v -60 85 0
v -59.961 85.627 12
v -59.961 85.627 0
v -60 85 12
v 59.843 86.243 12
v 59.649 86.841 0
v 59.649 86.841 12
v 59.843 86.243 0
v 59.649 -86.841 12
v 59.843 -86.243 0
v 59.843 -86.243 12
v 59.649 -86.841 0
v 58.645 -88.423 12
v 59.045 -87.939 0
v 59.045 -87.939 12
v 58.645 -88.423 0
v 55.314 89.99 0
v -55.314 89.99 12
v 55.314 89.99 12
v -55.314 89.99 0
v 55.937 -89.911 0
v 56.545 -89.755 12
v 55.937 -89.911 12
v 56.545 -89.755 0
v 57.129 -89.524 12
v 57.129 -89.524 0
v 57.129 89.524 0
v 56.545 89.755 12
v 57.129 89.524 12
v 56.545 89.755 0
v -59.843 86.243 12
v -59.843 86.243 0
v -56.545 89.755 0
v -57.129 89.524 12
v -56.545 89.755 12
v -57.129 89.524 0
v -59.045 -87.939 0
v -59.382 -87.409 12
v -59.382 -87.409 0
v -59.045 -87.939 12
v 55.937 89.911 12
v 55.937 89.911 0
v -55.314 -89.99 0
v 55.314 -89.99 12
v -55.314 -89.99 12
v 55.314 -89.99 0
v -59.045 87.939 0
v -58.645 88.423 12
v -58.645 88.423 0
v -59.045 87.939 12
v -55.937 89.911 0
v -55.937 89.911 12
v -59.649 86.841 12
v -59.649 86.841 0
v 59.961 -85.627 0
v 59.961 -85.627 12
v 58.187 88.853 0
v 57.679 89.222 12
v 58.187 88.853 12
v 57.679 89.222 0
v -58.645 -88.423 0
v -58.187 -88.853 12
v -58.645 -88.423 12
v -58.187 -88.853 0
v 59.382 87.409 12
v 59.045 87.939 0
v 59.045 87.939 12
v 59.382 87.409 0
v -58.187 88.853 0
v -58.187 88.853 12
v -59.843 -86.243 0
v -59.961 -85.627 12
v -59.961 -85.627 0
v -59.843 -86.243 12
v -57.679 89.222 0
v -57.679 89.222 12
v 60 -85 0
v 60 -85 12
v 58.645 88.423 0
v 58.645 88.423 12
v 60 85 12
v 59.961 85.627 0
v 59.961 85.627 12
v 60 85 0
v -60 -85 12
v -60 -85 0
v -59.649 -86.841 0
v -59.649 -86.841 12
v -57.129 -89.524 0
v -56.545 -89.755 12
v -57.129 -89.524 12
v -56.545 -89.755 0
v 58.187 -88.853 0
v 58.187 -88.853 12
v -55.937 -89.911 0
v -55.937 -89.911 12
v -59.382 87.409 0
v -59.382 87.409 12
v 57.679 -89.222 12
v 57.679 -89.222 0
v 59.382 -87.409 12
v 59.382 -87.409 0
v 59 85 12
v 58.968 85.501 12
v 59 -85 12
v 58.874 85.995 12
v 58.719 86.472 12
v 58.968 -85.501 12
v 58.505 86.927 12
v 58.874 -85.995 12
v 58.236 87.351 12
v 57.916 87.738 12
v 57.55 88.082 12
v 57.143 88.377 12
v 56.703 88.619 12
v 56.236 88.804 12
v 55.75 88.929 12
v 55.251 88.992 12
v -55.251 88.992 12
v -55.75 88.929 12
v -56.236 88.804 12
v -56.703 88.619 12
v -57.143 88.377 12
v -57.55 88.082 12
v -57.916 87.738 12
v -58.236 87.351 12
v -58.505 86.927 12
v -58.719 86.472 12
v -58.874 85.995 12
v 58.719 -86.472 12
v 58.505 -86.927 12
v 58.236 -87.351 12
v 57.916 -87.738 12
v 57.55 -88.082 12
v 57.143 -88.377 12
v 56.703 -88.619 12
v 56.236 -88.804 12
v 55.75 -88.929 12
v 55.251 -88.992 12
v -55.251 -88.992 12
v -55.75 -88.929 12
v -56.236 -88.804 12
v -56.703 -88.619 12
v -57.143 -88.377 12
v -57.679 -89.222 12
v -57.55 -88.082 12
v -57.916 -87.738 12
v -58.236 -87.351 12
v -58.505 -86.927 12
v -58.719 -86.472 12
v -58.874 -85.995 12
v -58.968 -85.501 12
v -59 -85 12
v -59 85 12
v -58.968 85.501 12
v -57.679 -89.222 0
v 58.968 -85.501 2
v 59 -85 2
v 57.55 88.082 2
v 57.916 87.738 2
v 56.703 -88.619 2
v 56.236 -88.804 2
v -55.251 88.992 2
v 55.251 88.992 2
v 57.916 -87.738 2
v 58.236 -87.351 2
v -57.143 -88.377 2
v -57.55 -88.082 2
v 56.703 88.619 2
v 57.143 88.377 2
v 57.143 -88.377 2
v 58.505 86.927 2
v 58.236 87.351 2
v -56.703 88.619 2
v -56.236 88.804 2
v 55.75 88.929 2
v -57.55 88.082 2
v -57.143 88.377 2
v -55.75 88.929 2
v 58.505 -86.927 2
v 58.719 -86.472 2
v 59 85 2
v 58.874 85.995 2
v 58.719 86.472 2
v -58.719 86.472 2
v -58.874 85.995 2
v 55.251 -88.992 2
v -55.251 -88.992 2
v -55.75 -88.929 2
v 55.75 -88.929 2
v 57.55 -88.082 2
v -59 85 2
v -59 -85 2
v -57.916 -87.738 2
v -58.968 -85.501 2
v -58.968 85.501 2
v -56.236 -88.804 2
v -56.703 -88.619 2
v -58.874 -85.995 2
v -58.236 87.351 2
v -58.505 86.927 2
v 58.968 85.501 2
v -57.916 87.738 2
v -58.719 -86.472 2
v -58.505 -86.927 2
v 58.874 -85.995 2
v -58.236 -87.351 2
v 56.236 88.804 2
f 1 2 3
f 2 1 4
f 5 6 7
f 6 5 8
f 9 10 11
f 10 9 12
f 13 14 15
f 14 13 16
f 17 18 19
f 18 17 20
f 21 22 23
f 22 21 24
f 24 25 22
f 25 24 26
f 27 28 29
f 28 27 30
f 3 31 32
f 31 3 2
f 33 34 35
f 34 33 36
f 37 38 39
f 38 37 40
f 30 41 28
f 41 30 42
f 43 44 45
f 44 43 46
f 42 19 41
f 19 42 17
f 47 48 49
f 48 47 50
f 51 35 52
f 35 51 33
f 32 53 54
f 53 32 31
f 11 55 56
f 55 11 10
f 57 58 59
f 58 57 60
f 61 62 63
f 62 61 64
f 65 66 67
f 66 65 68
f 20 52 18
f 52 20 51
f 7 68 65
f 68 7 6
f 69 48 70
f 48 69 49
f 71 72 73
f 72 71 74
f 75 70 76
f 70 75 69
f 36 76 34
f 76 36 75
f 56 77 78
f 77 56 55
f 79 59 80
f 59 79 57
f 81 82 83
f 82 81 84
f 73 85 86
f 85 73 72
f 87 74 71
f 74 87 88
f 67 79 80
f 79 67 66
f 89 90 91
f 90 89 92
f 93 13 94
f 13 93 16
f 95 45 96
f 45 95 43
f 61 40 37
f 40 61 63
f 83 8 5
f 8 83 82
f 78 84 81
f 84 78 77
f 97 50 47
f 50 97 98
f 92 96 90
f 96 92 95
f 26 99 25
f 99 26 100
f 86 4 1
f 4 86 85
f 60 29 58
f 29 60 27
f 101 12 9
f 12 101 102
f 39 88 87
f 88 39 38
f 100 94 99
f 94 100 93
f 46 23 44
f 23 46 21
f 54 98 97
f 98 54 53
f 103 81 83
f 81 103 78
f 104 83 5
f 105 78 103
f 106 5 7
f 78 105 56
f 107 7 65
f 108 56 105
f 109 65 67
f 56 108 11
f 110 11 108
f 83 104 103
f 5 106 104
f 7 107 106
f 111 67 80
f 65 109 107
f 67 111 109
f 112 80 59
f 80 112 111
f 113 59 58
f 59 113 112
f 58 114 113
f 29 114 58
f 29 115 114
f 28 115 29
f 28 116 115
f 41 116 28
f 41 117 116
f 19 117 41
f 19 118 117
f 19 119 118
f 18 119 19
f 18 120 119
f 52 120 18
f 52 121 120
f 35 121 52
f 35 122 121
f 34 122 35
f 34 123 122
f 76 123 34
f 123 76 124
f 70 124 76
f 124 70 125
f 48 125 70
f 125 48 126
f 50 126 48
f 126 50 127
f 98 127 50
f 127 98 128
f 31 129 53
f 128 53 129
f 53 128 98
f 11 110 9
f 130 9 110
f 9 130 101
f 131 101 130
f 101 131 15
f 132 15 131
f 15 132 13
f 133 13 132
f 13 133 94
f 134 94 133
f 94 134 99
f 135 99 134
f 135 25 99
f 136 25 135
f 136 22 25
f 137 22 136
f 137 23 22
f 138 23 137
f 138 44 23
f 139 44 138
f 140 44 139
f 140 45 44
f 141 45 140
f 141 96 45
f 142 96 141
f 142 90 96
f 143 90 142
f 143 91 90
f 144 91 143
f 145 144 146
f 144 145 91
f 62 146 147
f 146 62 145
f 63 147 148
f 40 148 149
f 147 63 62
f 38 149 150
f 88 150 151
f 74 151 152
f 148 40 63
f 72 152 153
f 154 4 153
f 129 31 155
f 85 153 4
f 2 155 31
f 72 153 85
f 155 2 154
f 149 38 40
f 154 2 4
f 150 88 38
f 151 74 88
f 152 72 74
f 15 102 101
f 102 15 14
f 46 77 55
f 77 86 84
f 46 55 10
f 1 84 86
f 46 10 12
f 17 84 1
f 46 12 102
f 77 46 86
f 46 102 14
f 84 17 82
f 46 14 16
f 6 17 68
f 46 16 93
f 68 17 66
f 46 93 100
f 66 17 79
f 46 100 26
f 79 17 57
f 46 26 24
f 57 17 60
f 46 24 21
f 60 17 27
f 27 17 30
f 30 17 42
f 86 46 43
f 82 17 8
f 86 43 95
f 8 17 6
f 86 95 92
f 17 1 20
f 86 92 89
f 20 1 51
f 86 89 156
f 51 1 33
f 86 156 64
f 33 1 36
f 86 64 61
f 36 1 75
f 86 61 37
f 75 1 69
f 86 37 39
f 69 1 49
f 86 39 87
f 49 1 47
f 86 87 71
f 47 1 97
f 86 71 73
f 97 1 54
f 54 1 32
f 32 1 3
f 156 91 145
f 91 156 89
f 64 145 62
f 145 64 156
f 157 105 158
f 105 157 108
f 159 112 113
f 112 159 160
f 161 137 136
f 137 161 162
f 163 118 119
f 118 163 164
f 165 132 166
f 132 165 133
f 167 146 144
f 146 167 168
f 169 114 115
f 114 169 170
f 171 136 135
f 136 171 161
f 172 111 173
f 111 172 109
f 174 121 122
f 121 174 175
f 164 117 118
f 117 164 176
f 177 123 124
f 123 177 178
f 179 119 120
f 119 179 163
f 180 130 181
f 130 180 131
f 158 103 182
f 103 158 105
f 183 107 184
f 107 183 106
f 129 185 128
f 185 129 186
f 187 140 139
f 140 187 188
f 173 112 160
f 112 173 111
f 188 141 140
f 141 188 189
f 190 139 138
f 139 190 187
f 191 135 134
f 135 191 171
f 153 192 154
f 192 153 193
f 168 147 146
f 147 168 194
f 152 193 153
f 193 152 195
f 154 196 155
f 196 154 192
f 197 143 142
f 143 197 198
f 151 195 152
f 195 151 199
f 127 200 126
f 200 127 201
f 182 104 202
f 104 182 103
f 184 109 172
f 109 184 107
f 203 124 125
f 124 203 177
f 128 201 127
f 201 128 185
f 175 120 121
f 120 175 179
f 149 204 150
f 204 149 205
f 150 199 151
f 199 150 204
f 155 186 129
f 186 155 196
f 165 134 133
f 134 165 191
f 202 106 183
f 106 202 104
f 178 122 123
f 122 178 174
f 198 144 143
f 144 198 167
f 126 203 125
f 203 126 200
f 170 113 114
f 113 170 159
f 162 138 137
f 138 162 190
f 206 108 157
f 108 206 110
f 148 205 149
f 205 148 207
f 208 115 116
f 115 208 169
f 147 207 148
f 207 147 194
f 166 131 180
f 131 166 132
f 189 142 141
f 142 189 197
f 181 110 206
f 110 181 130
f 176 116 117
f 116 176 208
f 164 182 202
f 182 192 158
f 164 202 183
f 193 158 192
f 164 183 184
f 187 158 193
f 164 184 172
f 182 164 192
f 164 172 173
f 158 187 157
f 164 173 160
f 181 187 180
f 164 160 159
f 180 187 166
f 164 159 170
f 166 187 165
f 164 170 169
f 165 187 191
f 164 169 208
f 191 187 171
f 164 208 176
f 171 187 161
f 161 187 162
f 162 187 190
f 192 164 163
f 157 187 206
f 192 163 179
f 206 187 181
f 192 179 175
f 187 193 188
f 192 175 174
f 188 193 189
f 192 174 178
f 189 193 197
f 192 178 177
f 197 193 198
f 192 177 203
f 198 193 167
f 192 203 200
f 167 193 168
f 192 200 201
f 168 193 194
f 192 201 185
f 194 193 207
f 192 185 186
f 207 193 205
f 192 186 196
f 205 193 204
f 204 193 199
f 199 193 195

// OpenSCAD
$fn = 50;


difference() {
	union() {
		hull() {
			translate(v = [-55.0000000000, 85.0000000000, 0]) {
				cylinder(h = 12, r = 5);
			}
			translate(v = [55.0000000000, 85.0000000000, 0]) {
				cylinder(h = 12, r = 5);
			}
			translate(v = [-55.0000000000, -85.0000000000, 0]) {
				cylinder(h = 12, r = 5);
			}
			translate(v = [55.0000000000, -85.0000000000, 0]) {
				cylinder(h = 12, r = 5);
			}
		}
	}
	union() {
		translate(v = [0, 0, 2]) {
			hull() {
				translate(v = [-55.0000000000, 85.0000000000, 0]) {
					cylinder(h = 10, r = 4);
				}
				translate(v = [55.0000000000, 85.0000000000, 0]) {
					cylinder(h = 10, r = 4);
				}
				translate(v = [-55.0000000000, -85.0000000000, 0]) {
					cylinder(h = 10, r = 4);
				}
				translate(v = [55.0000000000, -85.0000000000, 0]) {
					cylinder(h = 10, r = 4);
				}
			}
		}
	}
}
